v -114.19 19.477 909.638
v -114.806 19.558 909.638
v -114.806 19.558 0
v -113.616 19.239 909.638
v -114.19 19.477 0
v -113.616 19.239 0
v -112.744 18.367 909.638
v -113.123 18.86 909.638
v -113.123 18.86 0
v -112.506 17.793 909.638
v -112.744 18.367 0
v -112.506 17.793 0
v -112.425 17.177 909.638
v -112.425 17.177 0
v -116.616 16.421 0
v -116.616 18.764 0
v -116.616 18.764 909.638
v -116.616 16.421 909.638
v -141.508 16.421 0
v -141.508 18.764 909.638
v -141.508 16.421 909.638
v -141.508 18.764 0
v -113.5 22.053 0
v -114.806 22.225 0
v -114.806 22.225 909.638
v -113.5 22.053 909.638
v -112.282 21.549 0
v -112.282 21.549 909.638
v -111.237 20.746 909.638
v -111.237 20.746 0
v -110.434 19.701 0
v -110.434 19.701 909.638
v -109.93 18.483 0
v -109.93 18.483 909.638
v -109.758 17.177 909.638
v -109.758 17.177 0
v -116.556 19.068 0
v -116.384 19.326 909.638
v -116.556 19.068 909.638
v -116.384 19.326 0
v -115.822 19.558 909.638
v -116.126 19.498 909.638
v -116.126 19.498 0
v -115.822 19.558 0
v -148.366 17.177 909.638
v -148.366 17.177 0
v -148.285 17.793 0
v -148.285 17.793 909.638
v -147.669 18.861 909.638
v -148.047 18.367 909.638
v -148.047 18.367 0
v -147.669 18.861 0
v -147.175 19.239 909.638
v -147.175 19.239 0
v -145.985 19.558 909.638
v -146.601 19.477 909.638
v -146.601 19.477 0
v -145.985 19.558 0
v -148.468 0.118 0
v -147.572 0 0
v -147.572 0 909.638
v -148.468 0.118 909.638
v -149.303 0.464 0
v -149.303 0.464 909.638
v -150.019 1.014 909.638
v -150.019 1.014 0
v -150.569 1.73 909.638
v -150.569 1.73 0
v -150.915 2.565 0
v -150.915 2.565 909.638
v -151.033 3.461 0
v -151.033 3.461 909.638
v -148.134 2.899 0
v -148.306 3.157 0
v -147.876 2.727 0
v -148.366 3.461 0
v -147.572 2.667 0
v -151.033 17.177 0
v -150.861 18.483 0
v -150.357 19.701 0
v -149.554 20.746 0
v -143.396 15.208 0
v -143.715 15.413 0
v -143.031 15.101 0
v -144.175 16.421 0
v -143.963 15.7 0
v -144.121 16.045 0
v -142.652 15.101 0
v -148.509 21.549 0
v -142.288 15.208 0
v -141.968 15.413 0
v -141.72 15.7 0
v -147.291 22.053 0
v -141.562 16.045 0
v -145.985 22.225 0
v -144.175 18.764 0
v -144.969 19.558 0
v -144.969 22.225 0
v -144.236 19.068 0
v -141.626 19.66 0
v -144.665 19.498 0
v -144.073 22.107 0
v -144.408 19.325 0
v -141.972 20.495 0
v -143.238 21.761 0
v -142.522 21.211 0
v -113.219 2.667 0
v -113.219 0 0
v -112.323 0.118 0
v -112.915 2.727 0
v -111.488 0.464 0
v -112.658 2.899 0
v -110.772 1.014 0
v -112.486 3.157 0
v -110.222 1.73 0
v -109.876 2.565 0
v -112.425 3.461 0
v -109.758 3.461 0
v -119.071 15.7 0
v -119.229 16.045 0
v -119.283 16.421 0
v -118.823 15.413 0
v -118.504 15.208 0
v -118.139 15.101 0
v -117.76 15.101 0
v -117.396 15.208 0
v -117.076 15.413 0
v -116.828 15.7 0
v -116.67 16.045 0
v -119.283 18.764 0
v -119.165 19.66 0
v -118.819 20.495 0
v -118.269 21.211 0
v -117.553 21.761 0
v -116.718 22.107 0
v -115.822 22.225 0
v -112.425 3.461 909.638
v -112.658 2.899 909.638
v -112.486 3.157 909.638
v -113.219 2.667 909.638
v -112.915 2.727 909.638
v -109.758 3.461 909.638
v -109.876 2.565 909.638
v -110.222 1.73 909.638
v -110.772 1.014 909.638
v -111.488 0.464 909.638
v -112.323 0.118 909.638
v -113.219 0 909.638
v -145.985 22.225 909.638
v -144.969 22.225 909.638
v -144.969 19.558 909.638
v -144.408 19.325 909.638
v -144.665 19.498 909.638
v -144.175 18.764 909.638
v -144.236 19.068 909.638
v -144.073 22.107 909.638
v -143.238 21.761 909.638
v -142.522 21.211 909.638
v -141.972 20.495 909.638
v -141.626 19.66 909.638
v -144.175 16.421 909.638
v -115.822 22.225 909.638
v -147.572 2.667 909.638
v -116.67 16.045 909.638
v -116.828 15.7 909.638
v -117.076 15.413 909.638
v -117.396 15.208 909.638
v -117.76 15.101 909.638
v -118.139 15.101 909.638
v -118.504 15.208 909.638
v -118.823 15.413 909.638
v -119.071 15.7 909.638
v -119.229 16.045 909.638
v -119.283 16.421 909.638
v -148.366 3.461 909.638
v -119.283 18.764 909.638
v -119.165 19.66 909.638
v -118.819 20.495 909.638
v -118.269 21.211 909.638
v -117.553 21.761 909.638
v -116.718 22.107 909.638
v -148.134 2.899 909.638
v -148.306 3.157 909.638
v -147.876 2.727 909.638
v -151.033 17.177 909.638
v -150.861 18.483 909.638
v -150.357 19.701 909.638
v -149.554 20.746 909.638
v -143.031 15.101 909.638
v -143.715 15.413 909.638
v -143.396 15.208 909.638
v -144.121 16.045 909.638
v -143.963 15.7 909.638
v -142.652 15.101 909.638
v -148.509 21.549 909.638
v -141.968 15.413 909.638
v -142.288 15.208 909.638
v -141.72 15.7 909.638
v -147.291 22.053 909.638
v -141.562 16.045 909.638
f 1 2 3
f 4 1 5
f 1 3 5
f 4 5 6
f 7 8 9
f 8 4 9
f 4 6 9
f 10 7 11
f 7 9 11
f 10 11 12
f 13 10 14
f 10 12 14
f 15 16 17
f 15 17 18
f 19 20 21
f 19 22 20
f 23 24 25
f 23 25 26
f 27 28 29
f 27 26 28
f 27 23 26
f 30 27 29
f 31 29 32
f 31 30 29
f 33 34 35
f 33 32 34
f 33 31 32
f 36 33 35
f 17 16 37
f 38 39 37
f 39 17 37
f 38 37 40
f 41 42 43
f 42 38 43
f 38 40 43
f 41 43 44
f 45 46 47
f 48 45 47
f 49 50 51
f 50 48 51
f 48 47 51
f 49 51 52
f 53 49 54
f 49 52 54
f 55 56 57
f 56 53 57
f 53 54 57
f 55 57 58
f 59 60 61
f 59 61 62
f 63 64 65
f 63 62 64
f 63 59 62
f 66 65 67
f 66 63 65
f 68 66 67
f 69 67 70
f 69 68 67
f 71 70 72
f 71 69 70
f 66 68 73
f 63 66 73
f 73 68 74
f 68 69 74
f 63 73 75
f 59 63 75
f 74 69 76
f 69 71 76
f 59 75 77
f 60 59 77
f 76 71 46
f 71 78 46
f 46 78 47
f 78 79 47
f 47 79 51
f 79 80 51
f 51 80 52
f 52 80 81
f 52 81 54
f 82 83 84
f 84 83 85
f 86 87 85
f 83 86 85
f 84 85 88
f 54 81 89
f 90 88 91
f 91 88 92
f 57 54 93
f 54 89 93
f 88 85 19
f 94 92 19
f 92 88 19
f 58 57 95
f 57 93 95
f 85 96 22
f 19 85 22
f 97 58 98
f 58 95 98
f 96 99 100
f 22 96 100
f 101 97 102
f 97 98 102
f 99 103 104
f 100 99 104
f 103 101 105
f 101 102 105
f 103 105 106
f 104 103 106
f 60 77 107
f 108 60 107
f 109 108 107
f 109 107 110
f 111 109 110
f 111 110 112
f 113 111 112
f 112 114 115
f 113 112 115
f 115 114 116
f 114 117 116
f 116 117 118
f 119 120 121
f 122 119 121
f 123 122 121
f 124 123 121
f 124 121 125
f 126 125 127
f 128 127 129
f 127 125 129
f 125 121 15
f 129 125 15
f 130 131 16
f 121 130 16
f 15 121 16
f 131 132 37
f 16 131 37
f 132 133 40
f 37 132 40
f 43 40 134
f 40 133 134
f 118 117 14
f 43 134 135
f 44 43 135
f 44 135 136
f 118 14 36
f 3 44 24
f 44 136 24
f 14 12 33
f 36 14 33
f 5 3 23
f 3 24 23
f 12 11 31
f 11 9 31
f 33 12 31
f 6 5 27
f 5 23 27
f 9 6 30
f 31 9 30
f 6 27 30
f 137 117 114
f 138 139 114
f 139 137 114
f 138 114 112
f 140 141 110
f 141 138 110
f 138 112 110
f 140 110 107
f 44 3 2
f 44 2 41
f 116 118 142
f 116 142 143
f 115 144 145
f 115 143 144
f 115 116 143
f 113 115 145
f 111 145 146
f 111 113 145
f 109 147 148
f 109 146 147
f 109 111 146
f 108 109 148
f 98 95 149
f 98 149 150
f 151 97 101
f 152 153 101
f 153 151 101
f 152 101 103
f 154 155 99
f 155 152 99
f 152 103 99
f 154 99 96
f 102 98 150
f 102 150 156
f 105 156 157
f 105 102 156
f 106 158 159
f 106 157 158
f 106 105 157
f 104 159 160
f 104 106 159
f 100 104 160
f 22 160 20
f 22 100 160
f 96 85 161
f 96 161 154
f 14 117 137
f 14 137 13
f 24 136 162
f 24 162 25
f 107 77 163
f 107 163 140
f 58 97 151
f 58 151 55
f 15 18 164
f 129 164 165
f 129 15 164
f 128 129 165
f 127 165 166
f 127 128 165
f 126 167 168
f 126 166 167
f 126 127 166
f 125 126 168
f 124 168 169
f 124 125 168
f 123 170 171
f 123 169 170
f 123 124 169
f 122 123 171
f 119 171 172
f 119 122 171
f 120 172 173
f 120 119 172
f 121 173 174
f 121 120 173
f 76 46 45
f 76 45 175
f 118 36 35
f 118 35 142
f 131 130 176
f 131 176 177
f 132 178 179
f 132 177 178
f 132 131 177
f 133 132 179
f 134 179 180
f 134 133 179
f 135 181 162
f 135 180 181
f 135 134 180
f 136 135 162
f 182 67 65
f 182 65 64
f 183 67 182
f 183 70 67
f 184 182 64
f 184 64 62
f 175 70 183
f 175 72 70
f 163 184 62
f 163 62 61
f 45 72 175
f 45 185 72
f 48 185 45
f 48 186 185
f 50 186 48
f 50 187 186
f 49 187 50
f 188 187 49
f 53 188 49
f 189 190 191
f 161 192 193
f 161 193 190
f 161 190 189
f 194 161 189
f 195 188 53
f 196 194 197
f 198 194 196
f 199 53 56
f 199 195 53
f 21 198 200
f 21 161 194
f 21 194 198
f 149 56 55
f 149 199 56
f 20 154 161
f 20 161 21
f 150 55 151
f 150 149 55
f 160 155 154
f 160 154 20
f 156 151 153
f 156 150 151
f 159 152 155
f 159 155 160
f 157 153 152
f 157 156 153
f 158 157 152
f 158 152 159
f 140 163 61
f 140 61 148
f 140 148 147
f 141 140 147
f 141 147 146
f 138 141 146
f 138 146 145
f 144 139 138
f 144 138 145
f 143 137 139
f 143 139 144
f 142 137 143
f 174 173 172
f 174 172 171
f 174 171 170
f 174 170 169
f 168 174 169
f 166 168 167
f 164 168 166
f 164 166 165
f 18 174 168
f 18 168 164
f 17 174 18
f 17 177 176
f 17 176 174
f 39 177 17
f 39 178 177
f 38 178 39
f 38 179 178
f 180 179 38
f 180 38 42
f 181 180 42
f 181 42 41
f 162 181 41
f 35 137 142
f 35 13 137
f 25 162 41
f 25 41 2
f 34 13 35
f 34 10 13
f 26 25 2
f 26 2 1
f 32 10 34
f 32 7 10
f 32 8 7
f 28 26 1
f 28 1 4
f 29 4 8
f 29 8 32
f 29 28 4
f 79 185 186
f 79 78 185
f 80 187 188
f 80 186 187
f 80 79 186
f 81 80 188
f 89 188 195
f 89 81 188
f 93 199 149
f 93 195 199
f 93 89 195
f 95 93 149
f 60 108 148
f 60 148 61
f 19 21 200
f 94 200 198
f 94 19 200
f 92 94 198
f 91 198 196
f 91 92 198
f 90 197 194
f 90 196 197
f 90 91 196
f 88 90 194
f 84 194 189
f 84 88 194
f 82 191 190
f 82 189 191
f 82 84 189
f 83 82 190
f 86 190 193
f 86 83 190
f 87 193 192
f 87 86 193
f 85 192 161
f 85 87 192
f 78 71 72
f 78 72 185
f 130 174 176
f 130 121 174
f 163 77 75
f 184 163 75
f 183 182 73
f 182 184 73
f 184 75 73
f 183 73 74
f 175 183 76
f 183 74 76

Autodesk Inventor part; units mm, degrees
ref_plane "Work Plane1" through (0, 0, 0) normal (0, 0, 1) x (1, 0, 0)
ref_plane "Work Plane3" through (204.5669, 33.2743, 819.985) normal (0, 0, 1) x (1, 0, 0)
ref_plane "Work Plane4" through (204.5669, 0, 909.6375) normal (0, 0, 1) x (1, 0, 0)
sketch "Sketch1" plane through (0, 0, 0) normal (0, 0, 1) x (1, 0, 0)
  arc A0 (-113.2188, 0) -> (-109.7581, 3.4607) centre (-113.2188, 3.4607) ccw projected
  line L0 (-109.7581, 17.1767) -> (-109.7581, 3.4607) projected
  arc A1 (-109.7581, 17.1767) -> (-114.8063, 22.225) centre (-114.8063, 17.1767) ccw projected
  line L1 (-115.8223, 22.225) -> (-114.8063, 22.225) projected
  arc A2 (-115.8223, 22.225) -> (-119.2831, 18.7642) centre (-115.8223, 18.7642) ccw projected
  line L2 (-119.2831, 16.4211) -> (-119.2831, 18.7642) projected
  arc A3 (-119.2831, 16.4211) -> (-116.6161, 16.4211) centre (-117.9496, 16.4211) ccw projected
  line L3 (-116.6161, 18.7642) -> (-116.6161, 16.4211) projected
  arc A4 (-115.8223, 19.558) -> (-116.6161, 18.7642) centre (-115.8223, 18.7642) ccw projected
  line L4 (-114.8063, 19.558) -> (-115.8223, 19.558) projected
  arc A5 (-112.4251, 17.1767) -> (-114.8063, 19.558) centre (-114.8063, 17.1767) ccw projected
  line L5 (-112.4251, 3.4607) -> (-112.4251, 17.1767) projected
  arc A6 (-113.2188, 2.667) -> (-112.4251, 3.4607) centre (-113.2188, 3.4607) ccw projected
  line L6 (-147.5723, 2.667) -> (-113.2188, 2.667) projected
  arc A7 (-148.3661, 3.4607) -> (-147.5723, 2.667) centre (-147.5723, 3.4607) ccw projected
  line L7 (-148.3661, 17.1767) -> (-148.3661, 3.4607) projected
  arc A8 (-145.9848, 19.558) -> (-148.3661, 17.1767) centre (-145.9848, 17.1767) ccw projected
  line L8 (-144.9688, 19.558) -> (-145.9848, 19.558) projected
  arc A9 (-144.1751, 18.7642) -> (-144.9688, 19.558) centre (-144.9688, 18.7642) ccw projected
  line L9 (-144.1751, 16.4211) -> (-144.1751, 18.7642) projected
  arc A10 (-144.1751, 16.4211) -> (-141.5081, 16.4211) centre (-142.8416, 16.4211) ccw projected
  line L10 (-141.5081, 18.7642) -> (-141.5081, 16.4211) projected
  arc A11 (-141.5081, 18.7642) -> (-144.9688, 22.225) centre (-144.9688, 18.7642) ccw projected
  line L11 (-145.9848, 22.225) -> (-144.9688, 22.225) projected
  arc A12 (-145.9848, 22.225) -> (-151.0331, 17.1767) centre (-145.9848, 17.1767) ccw projected
  line L12 (-151.0331, 3.4607) -> (-151.0331, 17.1767) projected
  arc A13 (-151.0331, 3.4607) -> (-147.5723, 0) centre (-147.5723, 3.4607) ccw projected
  line L13 (-113.2188, 0) -> (-147.5723, 0) projected
  point P0 (0, 0)
extrude "Extrusion1" add sketch "Sketch1" along normal up to surface (909.6375 mm away)
properties part number "Horizontal-Unistrut-Tower-Connector-19-25"
